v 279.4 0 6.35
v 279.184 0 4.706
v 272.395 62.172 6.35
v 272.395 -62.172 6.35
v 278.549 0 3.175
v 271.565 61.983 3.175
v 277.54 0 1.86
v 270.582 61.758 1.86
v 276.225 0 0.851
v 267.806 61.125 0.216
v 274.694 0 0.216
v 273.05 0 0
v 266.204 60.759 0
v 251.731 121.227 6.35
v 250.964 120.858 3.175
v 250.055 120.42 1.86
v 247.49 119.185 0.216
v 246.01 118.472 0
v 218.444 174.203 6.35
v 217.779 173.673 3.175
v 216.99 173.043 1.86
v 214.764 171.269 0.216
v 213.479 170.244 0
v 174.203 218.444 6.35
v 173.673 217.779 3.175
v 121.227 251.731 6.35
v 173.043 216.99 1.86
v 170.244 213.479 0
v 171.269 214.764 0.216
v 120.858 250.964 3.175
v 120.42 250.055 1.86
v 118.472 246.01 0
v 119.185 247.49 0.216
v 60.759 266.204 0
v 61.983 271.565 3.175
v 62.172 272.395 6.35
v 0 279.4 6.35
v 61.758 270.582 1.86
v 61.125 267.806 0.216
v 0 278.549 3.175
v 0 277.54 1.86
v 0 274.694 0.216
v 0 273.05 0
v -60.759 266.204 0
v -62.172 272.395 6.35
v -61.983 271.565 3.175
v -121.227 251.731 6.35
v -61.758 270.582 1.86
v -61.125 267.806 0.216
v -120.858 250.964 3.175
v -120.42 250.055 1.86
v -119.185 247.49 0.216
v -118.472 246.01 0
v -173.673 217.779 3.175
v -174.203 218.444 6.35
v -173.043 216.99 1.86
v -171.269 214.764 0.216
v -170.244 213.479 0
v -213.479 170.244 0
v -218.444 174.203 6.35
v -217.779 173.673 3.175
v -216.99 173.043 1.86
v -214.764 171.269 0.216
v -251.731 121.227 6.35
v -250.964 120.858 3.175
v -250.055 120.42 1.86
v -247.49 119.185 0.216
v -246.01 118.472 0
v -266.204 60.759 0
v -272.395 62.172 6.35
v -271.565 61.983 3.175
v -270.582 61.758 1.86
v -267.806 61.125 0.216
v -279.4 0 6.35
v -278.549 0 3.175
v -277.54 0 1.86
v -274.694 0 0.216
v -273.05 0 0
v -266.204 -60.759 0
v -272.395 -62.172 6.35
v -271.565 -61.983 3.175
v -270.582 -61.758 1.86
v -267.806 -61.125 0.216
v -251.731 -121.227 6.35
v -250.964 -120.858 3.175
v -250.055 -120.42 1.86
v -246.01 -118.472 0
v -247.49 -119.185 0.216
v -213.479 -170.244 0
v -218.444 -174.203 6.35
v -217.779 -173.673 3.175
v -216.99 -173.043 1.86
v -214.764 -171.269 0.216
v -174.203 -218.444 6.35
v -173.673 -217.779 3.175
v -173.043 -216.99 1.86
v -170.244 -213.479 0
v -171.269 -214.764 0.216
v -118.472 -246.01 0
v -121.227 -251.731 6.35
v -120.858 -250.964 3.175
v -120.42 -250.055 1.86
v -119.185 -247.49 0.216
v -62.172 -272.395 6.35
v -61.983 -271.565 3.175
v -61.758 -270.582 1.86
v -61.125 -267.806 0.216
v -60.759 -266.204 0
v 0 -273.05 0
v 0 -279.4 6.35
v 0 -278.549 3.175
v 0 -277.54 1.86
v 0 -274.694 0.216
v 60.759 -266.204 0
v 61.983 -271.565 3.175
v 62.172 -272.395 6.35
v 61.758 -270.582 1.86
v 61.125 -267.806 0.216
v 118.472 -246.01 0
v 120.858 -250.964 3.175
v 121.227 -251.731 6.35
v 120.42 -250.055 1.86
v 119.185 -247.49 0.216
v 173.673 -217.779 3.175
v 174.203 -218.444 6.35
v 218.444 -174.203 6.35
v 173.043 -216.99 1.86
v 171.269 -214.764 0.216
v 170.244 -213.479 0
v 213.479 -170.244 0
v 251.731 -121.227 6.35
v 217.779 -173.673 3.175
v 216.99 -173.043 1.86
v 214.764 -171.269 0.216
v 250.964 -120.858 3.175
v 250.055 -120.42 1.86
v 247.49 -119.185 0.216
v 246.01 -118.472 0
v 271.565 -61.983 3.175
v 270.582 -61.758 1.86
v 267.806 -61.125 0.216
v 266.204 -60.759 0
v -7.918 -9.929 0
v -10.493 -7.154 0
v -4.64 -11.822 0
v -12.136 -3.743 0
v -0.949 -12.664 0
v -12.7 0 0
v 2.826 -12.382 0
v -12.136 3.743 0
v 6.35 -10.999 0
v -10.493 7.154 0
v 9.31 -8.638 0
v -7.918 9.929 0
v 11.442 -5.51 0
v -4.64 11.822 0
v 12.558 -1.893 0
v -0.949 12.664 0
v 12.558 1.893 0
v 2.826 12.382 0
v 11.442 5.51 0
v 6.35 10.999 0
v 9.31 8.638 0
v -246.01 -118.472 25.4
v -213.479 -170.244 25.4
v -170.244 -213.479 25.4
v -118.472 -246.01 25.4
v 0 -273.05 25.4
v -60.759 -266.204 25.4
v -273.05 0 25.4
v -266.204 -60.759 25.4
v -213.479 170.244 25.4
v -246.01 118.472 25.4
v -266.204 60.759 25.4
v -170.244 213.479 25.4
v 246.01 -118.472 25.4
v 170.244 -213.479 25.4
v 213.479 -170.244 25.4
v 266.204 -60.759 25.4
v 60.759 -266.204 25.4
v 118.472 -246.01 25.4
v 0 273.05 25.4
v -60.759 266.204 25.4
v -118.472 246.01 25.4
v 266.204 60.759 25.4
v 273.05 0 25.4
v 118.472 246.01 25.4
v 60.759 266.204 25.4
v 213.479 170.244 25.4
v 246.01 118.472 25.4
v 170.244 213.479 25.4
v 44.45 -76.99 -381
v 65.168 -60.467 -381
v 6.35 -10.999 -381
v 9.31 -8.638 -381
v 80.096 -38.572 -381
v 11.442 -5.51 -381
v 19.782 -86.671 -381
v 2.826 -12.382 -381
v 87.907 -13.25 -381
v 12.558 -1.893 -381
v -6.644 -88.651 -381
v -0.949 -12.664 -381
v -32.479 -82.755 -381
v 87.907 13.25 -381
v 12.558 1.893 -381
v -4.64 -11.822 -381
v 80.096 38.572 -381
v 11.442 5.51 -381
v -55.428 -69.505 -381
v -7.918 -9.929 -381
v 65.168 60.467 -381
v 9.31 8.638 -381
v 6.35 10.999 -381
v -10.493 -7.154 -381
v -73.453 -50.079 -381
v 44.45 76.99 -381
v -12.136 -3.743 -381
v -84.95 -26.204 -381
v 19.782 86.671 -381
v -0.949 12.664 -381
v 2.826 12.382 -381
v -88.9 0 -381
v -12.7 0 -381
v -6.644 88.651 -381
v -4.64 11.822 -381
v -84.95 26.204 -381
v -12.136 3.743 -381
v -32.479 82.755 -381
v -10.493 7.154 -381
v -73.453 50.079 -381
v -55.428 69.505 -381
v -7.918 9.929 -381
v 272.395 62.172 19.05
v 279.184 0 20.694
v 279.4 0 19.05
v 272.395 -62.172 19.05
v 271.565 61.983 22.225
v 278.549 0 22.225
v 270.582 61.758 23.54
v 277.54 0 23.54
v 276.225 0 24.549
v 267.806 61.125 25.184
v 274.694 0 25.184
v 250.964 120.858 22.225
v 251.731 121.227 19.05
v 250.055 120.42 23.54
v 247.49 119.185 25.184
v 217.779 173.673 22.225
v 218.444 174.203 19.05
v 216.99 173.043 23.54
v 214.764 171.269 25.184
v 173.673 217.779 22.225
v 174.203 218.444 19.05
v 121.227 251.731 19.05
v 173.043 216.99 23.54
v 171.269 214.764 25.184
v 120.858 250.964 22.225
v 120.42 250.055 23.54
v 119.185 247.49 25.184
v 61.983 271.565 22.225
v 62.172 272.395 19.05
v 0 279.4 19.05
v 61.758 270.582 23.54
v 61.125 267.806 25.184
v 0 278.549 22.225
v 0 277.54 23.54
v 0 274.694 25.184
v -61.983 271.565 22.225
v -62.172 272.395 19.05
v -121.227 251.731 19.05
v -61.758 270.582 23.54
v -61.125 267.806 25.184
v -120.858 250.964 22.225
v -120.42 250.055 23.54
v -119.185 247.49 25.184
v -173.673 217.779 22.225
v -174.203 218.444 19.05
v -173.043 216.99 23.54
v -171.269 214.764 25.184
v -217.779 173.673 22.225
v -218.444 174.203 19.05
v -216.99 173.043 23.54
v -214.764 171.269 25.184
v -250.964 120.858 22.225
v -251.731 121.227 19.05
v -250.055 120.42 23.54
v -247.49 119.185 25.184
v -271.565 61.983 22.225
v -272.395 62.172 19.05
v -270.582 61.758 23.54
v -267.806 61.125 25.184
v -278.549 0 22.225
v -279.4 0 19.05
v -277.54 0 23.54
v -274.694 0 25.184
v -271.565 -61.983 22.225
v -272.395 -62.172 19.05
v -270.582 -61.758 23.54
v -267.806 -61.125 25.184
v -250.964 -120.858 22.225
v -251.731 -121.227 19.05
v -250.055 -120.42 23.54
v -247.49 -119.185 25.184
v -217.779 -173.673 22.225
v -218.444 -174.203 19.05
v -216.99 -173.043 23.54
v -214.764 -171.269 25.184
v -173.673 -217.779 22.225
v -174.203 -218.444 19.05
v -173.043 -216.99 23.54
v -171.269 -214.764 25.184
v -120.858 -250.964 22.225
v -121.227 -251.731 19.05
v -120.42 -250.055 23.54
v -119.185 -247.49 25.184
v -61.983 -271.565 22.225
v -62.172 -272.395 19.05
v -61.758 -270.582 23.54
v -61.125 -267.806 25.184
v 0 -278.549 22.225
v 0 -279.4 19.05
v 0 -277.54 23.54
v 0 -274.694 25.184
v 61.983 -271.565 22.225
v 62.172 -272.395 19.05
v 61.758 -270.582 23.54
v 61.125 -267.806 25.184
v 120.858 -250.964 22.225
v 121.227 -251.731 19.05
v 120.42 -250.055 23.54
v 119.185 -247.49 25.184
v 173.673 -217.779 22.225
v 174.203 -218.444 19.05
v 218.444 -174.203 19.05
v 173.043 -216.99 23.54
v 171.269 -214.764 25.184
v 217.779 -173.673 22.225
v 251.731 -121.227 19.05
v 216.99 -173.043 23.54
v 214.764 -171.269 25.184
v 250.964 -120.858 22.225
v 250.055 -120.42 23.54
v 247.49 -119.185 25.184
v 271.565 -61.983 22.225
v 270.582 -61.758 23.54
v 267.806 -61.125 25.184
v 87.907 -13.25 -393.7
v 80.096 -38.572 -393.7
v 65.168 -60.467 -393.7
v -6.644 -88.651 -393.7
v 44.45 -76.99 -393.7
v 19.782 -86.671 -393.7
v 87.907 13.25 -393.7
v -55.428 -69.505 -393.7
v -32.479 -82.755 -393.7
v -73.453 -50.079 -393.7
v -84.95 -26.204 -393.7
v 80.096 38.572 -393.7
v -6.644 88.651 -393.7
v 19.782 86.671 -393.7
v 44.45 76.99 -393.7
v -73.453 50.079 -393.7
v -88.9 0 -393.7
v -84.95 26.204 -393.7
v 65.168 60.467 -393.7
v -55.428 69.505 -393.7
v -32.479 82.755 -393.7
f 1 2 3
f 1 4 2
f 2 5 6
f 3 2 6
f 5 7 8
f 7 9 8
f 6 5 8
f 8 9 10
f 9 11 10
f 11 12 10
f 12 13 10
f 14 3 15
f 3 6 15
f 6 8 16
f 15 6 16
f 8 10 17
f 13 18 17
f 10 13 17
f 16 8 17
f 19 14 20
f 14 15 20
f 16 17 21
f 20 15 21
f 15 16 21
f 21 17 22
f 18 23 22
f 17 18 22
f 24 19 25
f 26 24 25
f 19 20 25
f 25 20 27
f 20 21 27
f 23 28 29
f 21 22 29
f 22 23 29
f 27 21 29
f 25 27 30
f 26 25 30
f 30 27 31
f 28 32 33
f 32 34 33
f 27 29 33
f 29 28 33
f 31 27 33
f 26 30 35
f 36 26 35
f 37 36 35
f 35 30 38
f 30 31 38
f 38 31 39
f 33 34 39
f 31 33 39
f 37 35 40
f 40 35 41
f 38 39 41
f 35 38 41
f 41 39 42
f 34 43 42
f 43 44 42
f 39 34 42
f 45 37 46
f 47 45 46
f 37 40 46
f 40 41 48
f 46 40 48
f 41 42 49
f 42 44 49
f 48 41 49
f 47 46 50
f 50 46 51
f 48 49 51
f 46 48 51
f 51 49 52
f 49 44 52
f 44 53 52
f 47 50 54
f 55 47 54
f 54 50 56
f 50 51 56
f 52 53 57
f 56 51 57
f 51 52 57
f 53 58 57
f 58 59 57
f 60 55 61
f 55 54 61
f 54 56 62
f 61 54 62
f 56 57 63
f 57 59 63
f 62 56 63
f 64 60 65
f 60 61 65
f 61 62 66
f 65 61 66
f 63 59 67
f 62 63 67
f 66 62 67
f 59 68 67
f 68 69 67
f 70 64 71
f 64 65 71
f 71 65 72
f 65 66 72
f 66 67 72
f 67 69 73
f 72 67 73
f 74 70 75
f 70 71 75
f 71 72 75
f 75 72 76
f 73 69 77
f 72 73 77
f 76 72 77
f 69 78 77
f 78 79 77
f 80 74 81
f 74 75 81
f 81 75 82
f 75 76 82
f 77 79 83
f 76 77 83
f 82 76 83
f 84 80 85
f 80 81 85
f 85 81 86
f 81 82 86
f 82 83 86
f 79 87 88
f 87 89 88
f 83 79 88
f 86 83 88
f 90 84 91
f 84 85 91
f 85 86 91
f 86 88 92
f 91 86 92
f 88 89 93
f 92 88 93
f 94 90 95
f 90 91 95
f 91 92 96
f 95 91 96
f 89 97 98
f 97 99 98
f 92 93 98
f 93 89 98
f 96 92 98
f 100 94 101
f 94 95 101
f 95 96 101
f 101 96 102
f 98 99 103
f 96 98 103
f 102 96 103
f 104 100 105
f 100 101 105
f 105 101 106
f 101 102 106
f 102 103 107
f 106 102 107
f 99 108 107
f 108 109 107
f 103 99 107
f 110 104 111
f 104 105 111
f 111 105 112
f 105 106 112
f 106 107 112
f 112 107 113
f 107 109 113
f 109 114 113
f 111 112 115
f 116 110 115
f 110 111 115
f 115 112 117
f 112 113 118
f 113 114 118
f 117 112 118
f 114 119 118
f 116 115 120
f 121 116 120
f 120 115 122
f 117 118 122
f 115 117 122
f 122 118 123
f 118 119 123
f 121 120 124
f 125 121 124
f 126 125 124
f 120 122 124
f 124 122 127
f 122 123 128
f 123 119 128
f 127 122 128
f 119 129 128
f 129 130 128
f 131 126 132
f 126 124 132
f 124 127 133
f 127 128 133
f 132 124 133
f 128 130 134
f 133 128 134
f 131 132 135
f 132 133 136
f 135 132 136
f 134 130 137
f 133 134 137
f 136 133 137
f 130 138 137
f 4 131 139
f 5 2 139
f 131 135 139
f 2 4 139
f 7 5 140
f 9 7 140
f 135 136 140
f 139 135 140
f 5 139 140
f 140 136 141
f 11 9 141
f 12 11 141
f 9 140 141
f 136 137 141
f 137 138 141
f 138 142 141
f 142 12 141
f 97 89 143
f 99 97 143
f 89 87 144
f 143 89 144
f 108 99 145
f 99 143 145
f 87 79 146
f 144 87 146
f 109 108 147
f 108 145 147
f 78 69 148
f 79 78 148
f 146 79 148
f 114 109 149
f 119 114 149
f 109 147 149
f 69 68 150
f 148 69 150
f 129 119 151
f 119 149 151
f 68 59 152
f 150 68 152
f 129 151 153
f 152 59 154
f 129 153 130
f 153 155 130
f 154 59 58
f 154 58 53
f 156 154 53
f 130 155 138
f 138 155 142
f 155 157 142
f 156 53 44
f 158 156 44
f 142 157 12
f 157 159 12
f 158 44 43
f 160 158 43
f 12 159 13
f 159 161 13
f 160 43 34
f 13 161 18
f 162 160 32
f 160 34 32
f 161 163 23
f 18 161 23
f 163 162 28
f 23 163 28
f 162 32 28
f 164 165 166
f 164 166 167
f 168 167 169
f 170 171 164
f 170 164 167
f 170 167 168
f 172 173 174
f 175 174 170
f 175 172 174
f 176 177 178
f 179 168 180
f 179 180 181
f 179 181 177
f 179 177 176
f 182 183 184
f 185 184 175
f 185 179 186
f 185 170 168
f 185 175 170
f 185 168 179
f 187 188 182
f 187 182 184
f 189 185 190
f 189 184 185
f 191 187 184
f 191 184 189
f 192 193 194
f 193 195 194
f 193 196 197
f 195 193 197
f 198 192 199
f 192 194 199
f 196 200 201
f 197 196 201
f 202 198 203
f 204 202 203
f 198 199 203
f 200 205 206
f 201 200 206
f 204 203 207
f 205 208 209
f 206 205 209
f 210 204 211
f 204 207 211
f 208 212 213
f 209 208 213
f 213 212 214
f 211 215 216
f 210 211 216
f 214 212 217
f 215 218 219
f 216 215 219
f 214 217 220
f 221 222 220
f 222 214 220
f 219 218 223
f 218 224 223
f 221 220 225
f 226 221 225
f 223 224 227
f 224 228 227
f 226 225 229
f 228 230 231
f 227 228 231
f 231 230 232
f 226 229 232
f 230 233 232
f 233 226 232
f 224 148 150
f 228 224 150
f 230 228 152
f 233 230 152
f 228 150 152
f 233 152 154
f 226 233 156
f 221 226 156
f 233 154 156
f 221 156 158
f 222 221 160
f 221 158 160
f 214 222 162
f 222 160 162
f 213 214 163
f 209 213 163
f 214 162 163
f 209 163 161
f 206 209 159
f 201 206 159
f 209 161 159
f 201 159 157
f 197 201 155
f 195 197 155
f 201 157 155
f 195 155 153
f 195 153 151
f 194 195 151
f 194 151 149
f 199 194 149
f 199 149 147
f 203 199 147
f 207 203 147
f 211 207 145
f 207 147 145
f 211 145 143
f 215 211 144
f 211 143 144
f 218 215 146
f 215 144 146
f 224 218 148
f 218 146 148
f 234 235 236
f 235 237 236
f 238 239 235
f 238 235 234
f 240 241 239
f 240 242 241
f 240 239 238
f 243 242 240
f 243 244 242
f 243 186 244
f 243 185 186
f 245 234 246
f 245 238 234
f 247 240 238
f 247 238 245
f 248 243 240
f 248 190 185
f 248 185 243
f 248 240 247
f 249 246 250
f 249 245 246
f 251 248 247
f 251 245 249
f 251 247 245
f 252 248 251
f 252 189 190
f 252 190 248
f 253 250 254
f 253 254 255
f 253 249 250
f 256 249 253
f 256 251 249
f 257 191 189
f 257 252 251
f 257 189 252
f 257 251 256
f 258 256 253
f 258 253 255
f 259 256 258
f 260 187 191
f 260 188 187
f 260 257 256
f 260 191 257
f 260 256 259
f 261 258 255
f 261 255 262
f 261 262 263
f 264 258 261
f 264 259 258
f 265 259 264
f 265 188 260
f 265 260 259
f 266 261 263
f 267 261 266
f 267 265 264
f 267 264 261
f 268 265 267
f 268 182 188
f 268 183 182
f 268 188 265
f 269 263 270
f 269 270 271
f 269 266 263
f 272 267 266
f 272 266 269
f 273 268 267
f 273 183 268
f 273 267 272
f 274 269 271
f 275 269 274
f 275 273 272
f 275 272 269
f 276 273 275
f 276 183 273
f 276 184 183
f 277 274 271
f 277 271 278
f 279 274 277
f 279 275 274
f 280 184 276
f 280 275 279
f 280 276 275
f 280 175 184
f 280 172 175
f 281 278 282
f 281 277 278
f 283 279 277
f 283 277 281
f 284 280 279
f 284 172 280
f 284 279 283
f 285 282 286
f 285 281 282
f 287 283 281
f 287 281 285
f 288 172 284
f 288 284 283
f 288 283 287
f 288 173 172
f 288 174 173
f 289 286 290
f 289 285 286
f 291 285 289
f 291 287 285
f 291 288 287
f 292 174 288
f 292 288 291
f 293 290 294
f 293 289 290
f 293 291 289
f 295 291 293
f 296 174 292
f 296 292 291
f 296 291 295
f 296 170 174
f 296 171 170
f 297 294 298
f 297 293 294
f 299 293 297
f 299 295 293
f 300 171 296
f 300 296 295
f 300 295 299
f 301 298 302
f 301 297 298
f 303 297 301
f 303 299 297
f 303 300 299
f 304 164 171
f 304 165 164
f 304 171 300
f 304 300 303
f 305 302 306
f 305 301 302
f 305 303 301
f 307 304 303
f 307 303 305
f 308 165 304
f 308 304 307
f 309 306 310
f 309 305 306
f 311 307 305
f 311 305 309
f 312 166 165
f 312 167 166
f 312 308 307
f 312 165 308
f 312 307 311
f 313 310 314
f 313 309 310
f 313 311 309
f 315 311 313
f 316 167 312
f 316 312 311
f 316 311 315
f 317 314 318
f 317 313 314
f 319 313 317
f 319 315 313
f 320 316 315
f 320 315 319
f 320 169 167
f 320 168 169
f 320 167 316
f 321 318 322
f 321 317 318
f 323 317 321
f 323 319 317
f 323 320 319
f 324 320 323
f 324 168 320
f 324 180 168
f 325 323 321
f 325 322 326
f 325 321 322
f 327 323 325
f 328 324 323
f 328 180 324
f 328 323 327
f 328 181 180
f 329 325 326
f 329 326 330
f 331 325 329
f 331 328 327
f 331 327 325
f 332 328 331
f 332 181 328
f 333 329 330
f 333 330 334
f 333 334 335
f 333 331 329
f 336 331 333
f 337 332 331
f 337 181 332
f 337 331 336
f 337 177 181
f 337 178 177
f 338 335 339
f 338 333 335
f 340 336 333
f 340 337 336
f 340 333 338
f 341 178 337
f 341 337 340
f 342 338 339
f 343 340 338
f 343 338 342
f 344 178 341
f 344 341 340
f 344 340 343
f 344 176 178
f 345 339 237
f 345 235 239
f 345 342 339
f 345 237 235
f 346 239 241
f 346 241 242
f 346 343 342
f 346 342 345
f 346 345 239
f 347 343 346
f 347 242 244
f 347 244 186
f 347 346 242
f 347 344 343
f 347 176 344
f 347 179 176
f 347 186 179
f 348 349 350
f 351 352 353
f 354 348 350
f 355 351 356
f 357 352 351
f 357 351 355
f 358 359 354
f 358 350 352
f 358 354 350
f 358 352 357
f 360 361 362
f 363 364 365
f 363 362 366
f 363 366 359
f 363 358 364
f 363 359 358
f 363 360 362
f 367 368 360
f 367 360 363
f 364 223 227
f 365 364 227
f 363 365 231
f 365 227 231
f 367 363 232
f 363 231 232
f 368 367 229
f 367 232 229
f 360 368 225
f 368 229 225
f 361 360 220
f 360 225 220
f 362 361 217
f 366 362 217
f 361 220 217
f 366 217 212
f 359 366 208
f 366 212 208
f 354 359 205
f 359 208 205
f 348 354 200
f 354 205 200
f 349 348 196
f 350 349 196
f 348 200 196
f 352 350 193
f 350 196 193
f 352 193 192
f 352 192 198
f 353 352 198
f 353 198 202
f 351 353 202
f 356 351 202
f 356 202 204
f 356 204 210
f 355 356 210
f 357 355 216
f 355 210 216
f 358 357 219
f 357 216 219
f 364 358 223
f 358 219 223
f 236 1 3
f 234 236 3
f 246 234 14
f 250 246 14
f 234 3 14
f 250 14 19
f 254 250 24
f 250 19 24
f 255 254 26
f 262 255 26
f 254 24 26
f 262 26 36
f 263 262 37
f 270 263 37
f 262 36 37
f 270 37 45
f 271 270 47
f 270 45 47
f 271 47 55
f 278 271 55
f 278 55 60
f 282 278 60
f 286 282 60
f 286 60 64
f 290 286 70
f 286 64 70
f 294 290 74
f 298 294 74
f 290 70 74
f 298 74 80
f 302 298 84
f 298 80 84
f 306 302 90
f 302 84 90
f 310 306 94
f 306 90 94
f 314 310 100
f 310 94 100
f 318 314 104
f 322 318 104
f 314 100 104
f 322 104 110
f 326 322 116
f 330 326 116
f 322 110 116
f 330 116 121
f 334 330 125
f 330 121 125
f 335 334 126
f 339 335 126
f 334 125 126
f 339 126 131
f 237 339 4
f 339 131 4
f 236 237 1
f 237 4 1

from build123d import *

# Parameters (mm, degrees)
SKETCH1_R               = 279.4
BASE_EXTRUDE_DEPTH      = 25.4
SKETCH5_R               = 12.7
BOSS_EXTRUDE1_DEPTH     = 381
FILLET2_R               = 6.35
CROQUIS1_R              = 88.9
SALIENTE_EXTRUIR1_DEPTH = 12.7


with BuildPart() as part:
    # Sketch1 → Base-Extrude (new body)
    with BuildSketch(Plane.XY):
        Circle(SKETCH1_R)
    extrude(amount=BASE_EXTRUDE_DEPTH)

    # Sketch5 → Boss-Extrude1 (add)
    with BuildSketch(Plane(origin=(0, 0, 0), x_dir=(-1, 0, 0), z_dir=(0, 0, -1))):
        Circle(SKETCH5_R)
    extrude(amount=BOSS_EXTRUDE1_DEPTH)

    # Fillet2
    fillet2_edges = [part.edges().sort_by_distance(p)[0] for p in [
        (-279.4, 0, 0),
        (-279.4, 0, 25.4),
    ]]
    fillet(fillet2_edges, radius=FILLET2_R)

    # Croquis1 → Saliente-Extruir1 (add)
    with BuildSketch(Plane(origin=(0, 0, -381), x_dir=(-1, 0, 0), z_dir=(0, 0, -1))):
        Circle(CROQUIS1_R)
    extrude(amount=SALIENTE_EXTRUIR1_DEPTH)


solid = part.part
